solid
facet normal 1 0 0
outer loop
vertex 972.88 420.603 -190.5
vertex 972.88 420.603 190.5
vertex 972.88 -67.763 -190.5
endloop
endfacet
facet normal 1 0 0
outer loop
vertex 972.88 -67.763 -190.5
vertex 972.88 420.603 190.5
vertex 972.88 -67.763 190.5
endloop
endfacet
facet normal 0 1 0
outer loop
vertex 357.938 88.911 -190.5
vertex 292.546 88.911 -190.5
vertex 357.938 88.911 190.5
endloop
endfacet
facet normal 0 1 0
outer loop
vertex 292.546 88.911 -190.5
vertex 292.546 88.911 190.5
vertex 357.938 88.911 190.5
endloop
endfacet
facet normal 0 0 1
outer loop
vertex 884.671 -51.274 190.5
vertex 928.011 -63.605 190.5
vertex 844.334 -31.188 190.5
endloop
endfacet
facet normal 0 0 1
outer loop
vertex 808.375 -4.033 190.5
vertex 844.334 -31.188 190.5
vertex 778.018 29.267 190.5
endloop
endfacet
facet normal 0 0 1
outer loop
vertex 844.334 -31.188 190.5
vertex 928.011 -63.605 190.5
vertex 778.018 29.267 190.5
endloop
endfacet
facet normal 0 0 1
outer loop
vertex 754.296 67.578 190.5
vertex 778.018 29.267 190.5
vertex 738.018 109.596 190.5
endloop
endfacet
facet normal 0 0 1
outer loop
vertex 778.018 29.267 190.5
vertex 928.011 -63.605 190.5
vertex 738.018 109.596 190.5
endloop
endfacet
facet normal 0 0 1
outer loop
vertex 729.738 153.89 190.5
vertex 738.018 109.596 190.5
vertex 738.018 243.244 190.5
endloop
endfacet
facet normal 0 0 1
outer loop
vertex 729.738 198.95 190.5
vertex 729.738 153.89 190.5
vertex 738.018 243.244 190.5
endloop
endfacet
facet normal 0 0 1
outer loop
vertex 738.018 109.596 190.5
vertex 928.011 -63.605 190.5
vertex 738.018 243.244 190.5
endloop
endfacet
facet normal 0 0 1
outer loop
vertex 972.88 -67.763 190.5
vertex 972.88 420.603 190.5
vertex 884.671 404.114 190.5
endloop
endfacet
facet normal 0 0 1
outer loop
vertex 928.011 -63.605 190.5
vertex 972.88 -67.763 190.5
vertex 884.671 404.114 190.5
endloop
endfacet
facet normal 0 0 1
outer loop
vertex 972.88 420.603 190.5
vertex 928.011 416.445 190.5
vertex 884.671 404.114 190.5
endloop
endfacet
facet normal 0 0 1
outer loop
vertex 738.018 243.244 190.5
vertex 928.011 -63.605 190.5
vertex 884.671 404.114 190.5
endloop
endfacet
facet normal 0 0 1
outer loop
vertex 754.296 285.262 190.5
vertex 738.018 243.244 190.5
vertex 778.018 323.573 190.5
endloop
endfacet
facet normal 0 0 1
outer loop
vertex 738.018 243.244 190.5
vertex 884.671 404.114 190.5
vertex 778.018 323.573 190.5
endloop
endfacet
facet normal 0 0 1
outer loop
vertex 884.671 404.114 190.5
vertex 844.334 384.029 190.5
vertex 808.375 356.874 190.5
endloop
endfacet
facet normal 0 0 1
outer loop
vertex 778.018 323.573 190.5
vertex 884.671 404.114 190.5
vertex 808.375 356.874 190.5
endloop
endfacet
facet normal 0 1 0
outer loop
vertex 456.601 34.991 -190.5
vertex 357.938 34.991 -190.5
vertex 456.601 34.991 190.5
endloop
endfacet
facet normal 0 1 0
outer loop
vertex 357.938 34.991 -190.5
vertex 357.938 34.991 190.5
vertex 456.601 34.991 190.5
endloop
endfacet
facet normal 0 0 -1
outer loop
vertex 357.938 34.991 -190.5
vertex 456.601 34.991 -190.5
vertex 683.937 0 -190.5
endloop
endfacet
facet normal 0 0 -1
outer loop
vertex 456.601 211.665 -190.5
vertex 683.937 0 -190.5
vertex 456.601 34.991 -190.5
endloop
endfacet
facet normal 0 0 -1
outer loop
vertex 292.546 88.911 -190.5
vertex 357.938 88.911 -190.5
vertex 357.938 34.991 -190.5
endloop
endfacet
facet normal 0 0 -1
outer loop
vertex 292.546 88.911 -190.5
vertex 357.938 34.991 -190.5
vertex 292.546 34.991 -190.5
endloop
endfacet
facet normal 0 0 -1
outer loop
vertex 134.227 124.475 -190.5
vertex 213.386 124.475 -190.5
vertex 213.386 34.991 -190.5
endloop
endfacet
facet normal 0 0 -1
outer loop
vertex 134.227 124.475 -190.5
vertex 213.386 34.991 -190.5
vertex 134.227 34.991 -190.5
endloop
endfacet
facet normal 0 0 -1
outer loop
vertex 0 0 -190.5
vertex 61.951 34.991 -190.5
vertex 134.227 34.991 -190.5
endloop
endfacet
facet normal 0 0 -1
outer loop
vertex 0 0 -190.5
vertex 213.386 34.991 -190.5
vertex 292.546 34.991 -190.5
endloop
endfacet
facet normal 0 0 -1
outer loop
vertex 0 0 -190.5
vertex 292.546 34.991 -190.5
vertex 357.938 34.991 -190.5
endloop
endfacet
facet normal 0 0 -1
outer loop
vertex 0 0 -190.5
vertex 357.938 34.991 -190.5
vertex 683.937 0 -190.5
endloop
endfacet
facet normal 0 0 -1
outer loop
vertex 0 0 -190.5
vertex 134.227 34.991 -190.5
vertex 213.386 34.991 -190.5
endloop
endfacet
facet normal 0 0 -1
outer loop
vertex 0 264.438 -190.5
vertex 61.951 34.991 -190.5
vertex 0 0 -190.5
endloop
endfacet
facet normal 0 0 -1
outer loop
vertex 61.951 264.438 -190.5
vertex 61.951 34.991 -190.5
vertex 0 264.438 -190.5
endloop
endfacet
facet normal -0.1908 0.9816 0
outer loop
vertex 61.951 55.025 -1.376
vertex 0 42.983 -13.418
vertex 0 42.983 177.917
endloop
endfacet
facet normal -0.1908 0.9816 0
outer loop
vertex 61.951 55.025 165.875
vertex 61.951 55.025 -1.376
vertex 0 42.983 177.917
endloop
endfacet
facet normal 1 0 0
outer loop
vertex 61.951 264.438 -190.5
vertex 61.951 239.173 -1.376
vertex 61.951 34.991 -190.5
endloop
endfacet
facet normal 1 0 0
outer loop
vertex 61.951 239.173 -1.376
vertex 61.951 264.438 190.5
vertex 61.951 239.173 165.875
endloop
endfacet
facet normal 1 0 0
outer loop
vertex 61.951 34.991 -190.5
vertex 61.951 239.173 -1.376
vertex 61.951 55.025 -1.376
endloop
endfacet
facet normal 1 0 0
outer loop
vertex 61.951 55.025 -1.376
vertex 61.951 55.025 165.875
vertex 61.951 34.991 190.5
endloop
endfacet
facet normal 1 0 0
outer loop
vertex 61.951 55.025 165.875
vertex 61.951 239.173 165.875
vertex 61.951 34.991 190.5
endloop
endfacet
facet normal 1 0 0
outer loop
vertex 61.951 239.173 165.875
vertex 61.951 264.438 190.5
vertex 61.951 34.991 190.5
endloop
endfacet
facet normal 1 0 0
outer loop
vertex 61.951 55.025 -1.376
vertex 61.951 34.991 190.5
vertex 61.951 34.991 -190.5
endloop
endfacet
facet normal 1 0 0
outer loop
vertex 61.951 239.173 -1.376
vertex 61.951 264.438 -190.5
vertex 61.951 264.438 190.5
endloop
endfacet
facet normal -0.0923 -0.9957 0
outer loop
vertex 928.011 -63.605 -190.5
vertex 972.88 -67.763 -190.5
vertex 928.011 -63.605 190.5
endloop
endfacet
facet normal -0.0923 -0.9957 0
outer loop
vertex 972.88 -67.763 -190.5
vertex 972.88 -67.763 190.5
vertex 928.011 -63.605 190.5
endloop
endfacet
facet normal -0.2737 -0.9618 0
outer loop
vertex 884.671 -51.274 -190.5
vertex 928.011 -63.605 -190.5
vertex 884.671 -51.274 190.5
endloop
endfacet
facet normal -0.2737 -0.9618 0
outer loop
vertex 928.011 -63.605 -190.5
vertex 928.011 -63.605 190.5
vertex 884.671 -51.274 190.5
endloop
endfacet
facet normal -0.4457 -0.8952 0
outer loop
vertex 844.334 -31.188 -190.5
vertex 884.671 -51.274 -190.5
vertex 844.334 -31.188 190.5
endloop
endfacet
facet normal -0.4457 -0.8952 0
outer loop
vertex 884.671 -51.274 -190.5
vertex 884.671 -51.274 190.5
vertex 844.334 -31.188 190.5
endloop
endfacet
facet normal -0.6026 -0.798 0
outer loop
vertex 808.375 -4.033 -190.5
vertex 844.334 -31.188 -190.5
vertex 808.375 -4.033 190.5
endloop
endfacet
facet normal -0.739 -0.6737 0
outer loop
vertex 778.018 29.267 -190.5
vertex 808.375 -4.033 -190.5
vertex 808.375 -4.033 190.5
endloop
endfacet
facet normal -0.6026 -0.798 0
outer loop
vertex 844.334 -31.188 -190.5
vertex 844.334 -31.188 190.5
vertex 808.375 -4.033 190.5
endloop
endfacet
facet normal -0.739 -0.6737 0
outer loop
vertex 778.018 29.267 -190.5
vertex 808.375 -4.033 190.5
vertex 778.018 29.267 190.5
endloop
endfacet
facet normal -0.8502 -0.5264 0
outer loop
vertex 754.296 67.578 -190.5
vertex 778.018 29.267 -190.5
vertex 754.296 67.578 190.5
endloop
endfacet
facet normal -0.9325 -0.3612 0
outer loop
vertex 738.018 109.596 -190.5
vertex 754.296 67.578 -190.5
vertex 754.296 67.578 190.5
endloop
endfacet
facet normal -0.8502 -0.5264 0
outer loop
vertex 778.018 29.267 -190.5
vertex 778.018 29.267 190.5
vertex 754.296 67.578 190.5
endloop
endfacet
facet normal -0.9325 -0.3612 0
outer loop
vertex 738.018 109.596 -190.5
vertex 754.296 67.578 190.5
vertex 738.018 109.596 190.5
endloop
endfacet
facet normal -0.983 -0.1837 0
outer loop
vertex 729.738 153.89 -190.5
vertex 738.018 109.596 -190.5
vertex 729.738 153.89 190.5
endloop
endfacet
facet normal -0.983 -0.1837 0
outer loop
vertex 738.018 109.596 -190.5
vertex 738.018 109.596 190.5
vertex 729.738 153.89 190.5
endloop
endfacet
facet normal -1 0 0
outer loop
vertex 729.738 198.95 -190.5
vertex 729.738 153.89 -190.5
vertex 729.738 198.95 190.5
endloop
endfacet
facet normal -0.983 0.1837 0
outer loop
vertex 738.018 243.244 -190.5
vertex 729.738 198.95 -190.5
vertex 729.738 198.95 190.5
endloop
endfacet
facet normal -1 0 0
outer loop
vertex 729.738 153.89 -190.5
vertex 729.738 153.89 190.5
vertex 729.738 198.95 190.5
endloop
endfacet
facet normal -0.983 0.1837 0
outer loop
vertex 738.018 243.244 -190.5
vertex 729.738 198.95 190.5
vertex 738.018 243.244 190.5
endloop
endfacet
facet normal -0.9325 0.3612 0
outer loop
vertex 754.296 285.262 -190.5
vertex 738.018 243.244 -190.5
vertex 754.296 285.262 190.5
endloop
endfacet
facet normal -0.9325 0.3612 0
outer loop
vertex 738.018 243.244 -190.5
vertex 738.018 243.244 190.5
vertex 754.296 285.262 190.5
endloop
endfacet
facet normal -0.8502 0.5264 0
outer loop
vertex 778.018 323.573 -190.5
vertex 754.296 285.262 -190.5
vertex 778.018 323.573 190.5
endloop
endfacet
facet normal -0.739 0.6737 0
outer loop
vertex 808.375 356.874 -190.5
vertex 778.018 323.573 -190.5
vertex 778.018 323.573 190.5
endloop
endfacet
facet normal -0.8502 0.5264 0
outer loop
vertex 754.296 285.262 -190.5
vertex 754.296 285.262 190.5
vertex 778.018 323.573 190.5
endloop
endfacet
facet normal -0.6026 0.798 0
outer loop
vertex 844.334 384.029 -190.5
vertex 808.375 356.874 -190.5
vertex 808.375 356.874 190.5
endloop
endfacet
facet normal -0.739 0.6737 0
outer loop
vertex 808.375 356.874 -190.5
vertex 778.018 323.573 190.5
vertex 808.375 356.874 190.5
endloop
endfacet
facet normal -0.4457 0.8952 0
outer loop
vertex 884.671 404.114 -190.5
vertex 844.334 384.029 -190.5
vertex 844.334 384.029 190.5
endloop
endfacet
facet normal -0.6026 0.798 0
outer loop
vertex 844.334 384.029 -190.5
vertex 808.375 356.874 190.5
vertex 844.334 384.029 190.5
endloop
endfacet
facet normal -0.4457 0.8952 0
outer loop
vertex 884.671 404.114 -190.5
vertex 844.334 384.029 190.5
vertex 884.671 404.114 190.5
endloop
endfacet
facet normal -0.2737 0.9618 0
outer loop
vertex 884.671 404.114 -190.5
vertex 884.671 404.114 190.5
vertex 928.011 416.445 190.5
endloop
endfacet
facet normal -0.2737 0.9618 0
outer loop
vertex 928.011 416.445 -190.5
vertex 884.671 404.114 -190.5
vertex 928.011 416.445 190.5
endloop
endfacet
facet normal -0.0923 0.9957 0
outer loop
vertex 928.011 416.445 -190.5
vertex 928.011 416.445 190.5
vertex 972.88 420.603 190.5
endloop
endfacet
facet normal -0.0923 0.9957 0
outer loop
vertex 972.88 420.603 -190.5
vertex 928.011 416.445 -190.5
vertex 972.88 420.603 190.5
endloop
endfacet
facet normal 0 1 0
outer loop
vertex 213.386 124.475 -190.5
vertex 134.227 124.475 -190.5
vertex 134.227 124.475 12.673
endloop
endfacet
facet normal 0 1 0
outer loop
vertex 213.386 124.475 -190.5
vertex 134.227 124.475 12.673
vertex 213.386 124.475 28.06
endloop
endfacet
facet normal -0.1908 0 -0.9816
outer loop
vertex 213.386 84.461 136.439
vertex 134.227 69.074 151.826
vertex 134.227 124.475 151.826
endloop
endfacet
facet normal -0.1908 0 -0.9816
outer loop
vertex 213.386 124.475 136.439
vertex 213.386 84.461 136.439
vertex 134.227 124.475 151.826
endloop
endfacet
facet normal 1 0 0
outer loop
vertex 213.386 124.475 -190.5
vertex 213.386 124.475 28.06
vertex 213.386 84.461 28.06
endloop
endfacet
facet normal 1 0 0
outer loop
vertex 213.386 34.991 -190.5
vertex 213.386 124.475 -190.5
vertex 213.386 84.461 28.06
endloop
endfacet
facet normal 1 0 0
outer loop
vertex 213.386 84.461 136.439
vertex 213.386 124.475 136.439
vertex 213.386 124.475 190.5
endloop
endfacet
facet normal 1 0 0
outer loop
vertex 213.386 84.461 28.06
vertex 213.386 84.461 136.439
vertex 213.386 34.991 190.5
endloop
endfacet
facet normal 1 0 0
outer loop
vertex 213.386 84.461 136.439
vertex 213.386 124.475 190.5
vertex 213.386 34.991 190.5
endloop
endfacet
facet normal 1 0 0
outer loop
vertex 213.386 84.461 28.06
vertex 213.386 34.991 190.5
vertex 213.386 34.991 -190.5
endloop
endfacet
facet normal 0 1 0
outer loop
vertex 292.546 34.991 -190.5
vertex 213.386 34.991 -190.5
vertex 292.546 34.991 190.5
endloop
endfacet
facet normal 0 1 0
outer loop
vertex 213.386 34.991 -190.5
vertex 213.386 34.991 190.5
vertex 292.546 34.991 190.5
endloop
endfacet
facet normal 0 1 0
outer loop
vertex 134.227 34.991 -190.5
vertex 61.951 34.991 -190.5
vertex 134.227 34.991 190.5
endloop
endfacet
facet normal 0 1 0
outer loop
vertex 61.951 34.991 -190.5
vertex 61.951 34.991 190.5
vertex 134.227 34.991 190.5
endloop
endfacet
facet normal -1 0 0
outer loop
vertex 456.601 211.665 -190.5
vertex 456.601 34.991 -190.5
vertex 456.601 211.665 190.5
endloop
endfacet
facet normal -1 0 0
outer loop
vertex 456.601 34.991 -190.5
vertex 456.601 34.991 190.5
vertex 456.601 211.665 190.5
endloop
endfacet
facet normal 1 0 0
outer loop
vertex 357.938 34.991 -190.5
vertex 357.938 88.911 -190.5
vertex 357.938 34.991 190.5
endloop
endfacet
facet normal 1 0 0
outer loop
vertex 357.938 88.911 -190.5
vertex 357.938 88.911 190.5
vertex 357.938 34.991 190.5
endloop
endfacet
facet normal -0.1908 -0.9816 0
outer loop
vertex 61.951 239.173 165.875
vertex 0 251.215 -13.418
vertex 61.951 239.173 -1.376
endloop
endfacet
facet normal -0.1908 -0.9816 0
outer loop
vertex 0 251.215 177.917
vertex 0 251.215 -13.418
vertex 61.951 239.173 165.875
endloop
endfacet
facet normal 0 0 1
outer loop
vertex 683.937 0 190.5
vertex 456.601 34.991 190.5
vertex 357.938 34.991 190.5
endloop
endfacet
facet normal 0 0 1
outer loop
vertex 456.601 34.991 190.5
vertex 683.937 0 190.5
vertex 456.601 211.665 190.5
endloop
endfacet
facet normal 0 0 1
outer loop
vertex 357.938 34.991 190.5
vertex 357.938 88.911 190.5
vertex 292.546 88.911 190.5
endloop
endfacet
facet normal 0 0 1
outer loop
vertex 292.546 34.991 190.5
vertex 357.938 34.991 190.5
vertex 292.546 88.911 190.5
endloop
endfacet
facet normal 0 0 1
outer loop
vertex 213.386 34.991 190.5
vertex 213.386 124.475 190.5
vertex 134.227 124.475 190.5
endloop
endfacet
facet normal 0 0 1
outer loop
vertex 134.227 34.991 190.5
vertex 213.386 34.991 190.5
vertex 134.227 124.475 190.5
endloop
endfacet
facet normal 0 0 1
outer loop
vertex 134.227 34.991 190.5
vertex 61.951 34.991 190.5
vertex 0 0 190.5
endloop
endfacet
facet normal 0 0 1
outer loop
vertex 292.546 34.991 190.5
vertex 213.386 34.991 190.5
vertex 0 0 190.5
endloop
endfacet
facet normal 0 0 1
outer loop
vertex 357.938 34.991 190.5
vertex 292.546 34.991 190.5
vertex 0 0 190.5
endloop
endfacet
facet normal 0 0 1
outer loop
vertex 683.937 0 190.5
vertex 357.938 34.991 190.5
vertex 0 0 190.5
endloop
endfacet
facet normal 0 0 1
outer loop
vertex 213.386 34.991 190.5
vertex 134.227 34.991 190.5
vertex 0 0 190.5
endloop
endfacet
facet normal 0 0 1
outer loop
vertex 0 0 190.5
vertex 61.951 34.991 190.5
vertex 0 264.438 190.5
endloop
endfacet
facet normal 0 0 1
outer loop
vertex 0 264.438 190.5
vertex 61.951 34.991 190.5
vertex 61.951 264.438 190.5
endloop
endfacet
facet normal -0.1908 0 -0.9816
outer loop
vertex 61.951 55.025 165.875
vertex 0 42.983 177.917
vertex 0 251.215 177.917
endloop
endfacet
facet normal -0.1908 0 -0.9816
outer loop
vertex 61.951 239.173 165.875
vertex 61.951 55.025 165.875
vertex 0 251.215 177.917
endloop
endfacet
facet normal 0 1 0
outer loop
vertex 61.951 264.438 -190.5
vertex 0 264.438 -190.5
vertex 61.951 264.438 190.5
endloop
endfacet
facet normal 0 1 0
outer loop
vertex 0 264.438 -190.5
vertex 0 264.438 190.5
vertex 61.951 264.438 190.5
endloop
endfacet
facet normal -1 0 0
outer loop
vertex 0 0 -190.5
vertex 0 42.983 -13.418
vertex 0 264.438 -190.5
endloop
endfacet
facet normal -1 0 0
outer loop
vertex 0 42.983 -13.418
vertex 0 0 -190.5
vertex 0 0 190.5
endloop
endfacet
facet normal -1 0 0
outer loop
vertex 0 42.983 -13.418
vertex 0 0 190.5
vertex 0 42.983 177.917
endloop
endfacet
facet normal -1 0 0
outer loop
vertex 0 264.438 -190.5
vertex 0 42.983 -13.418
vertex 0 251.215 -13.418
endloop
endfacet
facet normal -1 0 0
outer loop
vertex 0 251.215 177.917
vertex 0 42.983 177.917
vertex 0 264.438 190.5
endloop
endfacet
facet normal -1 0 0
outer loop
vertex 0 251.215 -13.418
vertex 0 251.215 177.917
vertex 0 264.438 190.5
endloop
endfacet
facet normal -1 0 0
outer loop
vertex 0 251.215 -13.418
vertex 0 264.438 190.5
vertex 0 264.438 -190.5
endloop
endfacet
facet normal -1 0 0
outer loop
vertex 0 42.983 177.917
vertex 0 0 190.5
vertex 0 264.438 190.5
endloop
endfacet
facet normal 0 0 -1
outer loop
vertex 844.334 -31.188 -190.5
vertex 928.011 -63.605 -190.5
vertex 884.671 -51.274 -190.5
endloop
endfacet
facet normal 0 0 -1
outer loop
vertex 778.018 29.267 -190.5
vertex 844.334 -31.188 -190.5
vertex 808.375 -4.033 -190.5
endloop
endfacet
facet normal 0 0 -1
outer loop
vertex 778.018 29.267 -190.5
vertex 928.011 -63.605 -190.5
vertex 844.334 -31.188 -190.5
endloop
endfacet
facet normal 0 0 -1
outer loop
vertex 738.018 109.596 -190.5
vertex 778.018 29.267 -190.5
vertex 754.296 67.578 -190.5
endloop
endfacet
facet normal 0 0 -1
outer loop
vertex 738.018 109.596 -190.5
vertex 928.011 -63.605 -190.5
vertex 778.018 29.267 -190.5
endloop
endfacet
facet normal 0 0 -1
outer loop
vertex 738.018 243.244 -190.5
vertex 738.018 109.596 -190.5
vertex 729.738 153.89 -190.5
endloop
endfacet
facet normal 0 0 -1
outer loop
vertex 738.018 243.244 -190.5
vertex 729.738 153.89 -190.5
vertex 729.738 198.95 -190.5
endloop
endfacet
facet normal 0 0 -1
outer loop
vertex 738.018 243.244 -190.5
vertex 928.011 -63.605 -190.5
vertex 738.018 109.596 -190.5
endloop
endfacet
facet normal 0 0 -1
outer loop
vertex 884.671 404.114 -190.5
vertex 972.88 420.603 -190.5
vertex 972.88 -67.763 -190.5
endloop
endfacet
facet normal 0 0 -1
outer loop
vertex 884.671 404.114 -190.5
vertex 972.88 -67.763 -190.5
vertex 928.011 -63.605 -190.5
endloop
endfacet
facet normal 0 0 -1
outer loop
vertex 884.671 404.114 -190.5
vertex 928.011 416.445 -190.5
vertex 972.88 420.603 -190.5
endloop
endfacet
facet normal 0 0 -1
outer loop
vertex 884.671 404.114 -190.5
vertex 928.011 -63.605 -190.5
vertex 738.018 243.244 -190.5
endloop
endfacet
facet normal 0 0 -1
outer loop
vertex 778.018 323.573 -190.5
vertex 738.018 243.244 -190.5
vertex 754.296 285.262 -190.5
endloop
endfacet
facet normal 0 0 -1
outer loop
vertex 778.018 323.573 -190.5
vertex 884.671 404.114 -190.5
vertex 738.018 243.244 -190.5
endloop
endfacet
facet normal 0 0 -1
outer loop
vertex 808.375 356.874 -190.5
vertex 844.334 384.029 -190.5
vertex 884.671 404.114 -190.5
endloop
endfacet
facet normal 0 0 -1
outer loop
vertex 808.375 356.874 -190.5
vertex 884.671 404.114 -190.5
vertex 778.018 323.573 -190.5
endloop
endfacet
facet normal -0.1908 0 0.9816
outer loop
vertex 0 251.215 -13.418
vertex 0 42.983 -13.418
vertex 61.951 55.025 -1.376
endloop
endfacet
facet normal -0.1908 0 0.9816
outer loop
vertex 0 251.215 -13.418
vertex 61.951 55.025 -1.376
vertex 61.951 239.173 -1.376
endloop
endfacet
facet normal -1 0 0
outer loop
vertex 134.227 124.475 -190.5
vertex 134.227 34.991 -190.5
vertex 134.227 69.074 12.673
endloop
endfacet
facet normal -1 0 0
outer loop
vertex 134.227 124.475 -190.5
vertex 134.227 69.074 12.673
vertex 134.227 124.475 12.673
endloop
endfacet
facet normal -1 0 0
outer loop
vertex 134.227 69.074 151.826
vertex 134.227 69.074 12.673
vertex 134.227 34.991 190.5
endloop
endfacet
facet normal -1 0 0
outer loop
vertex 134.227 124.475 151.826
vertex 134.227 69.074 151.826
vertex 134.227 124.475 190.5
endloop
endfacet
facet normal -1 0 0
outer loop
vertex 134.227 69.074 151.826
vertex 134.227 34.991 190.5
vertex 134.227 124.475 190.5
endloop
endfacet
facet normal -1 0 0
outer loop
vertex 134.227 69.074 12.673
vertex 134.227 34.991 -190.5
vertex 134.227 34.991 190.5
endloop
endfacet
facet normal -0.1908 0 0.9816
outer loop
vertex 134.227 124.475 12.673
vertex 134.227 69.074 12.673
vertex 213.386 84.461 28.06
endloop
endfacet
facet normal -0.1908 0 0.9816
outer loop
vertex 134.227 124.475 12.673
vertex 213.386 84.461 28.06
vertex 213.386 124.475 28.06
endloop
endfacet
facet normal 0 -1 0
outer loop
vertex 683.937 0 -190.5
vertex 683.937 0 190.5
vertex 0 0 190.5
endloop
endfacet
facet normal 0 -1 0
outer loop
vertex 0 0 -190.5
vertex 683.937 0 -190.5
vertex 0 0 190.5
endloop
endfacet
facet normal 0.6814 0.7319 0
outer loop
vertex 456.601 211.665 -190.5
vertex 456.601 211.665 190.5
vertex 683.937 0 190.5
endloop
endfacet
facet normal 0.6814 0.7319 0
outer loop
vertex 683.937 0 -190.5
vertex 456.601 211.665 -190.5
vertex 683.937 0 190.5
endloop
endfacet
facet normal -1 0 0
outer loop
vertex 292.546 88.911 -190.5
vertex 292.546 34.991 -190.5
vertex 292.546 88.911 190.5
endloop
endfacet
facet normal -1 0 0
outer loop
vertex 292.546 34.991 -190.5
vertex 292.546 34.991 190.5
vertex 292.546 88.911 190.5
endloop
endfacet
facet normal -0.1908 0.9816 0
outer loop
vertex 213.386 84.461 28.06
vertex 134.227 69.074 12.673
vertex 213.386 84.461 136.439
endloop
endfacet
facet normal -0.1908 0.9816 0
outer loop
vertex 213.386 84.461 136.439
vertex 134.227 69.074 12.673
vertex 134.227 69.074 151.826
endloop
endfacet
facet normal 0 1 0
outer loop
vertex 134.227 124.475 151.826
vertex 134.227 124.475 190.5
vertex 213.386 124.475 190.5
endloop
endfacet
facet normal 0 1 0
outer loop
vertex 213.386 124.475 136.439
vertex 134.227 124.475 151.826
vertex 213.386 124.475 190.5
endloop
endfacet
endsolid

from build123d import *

# Parameters (mm, degrees)
BOSS_EXTRUDE1_DEPTH   = 190.5
BOSS_EXTRUDE1_2_DEPTH = 190.5
SKETCH2_W             = 191.334958583
SKETCH2_H             = 208.232071809
CUT_EXTRUDE1_DEPTH    = 254
CUT_EXTRUDE1_DRAFT    = -11


with BuildPart() as part:
    # Sketch1 → Boss-Extrude1 (new, symmetric)
    with BuildSketch(Plane.XY):
        Polygon((0, 0), (0, 264.438275148), (61.950832356, 264.438275148), (61.950832356, 34.990747905), (134.226803438, 34.990747905), (134.226803438, 124.47528353), (213.386200337, 124.47528353), (213.386200337, 34.990747905), (292.545597236, 34.990747905), (292.545597236, 88.910916807), (357.9381425, 88.910916807), (357.9381425, 34.990747905), (456.600579215, 34.990747905), (456.600579215, 211.665343882), (683.937189208, 0), align=None)
    extrude(amount=BOSS_EXTRUDE1_DEPTH, both=True)


with BuildPart() as body_2:
    # Sketch1 → Boss-Extrude1 2 (new, symmetric)
    with BuildSketch(Plane.XY):
        with BuildLine():
            Line((972.879836168, 420.603130604), (972.879836168, -67.762908332))
            ThreePointArc((972.879836168, -67.762908332), (728.696816701, 176.420111136), (972.879836168, 420.603130604))
        make_face()
    extrude(amount=BOSS_EXTRUDE1_2_DEPTH, both=True)


with BuildPart() as cut_extrude1_tool:
    # Sketch2 → Cut-Extrude1 (with draft: the straight prism first)
    with BuildSketch(Plane.ZY):
        with Locations((82.249183495, 147.098649951)):
            Rectangle(SKETCH2_W, SKETCH2_H)
    extrude(amount=-CUT_EXTRUDE1_DEPTH)
    # Cut-Extrude1: the draft: its side faces are tilted about the plane it starts from
    cut_extrude1_sides = [cut_extrude1_tool.faces().sort_by_distance(p)[0] for p in [
        (127, 147.098649951, -13.418295797),
        (127, 42.982614046, 82.249183495),
        (127, 147.098649951, 177.916662786),
        (127, 251.214685855, 82.249183495),
    ]]
    draft(cut_extrude1_sides, Plane.ZY, CUT_EXTRUDE1_DRAFT)


with BuildPart() as part_1:
    add(part.part)

    # Cut-Extrude1: cut by cut_extrude1_tool
    add(cut_extrude1_tool.part, mode=Mode.SUBTRACT)


solid = Compound([body_2.part, part_1.part])
